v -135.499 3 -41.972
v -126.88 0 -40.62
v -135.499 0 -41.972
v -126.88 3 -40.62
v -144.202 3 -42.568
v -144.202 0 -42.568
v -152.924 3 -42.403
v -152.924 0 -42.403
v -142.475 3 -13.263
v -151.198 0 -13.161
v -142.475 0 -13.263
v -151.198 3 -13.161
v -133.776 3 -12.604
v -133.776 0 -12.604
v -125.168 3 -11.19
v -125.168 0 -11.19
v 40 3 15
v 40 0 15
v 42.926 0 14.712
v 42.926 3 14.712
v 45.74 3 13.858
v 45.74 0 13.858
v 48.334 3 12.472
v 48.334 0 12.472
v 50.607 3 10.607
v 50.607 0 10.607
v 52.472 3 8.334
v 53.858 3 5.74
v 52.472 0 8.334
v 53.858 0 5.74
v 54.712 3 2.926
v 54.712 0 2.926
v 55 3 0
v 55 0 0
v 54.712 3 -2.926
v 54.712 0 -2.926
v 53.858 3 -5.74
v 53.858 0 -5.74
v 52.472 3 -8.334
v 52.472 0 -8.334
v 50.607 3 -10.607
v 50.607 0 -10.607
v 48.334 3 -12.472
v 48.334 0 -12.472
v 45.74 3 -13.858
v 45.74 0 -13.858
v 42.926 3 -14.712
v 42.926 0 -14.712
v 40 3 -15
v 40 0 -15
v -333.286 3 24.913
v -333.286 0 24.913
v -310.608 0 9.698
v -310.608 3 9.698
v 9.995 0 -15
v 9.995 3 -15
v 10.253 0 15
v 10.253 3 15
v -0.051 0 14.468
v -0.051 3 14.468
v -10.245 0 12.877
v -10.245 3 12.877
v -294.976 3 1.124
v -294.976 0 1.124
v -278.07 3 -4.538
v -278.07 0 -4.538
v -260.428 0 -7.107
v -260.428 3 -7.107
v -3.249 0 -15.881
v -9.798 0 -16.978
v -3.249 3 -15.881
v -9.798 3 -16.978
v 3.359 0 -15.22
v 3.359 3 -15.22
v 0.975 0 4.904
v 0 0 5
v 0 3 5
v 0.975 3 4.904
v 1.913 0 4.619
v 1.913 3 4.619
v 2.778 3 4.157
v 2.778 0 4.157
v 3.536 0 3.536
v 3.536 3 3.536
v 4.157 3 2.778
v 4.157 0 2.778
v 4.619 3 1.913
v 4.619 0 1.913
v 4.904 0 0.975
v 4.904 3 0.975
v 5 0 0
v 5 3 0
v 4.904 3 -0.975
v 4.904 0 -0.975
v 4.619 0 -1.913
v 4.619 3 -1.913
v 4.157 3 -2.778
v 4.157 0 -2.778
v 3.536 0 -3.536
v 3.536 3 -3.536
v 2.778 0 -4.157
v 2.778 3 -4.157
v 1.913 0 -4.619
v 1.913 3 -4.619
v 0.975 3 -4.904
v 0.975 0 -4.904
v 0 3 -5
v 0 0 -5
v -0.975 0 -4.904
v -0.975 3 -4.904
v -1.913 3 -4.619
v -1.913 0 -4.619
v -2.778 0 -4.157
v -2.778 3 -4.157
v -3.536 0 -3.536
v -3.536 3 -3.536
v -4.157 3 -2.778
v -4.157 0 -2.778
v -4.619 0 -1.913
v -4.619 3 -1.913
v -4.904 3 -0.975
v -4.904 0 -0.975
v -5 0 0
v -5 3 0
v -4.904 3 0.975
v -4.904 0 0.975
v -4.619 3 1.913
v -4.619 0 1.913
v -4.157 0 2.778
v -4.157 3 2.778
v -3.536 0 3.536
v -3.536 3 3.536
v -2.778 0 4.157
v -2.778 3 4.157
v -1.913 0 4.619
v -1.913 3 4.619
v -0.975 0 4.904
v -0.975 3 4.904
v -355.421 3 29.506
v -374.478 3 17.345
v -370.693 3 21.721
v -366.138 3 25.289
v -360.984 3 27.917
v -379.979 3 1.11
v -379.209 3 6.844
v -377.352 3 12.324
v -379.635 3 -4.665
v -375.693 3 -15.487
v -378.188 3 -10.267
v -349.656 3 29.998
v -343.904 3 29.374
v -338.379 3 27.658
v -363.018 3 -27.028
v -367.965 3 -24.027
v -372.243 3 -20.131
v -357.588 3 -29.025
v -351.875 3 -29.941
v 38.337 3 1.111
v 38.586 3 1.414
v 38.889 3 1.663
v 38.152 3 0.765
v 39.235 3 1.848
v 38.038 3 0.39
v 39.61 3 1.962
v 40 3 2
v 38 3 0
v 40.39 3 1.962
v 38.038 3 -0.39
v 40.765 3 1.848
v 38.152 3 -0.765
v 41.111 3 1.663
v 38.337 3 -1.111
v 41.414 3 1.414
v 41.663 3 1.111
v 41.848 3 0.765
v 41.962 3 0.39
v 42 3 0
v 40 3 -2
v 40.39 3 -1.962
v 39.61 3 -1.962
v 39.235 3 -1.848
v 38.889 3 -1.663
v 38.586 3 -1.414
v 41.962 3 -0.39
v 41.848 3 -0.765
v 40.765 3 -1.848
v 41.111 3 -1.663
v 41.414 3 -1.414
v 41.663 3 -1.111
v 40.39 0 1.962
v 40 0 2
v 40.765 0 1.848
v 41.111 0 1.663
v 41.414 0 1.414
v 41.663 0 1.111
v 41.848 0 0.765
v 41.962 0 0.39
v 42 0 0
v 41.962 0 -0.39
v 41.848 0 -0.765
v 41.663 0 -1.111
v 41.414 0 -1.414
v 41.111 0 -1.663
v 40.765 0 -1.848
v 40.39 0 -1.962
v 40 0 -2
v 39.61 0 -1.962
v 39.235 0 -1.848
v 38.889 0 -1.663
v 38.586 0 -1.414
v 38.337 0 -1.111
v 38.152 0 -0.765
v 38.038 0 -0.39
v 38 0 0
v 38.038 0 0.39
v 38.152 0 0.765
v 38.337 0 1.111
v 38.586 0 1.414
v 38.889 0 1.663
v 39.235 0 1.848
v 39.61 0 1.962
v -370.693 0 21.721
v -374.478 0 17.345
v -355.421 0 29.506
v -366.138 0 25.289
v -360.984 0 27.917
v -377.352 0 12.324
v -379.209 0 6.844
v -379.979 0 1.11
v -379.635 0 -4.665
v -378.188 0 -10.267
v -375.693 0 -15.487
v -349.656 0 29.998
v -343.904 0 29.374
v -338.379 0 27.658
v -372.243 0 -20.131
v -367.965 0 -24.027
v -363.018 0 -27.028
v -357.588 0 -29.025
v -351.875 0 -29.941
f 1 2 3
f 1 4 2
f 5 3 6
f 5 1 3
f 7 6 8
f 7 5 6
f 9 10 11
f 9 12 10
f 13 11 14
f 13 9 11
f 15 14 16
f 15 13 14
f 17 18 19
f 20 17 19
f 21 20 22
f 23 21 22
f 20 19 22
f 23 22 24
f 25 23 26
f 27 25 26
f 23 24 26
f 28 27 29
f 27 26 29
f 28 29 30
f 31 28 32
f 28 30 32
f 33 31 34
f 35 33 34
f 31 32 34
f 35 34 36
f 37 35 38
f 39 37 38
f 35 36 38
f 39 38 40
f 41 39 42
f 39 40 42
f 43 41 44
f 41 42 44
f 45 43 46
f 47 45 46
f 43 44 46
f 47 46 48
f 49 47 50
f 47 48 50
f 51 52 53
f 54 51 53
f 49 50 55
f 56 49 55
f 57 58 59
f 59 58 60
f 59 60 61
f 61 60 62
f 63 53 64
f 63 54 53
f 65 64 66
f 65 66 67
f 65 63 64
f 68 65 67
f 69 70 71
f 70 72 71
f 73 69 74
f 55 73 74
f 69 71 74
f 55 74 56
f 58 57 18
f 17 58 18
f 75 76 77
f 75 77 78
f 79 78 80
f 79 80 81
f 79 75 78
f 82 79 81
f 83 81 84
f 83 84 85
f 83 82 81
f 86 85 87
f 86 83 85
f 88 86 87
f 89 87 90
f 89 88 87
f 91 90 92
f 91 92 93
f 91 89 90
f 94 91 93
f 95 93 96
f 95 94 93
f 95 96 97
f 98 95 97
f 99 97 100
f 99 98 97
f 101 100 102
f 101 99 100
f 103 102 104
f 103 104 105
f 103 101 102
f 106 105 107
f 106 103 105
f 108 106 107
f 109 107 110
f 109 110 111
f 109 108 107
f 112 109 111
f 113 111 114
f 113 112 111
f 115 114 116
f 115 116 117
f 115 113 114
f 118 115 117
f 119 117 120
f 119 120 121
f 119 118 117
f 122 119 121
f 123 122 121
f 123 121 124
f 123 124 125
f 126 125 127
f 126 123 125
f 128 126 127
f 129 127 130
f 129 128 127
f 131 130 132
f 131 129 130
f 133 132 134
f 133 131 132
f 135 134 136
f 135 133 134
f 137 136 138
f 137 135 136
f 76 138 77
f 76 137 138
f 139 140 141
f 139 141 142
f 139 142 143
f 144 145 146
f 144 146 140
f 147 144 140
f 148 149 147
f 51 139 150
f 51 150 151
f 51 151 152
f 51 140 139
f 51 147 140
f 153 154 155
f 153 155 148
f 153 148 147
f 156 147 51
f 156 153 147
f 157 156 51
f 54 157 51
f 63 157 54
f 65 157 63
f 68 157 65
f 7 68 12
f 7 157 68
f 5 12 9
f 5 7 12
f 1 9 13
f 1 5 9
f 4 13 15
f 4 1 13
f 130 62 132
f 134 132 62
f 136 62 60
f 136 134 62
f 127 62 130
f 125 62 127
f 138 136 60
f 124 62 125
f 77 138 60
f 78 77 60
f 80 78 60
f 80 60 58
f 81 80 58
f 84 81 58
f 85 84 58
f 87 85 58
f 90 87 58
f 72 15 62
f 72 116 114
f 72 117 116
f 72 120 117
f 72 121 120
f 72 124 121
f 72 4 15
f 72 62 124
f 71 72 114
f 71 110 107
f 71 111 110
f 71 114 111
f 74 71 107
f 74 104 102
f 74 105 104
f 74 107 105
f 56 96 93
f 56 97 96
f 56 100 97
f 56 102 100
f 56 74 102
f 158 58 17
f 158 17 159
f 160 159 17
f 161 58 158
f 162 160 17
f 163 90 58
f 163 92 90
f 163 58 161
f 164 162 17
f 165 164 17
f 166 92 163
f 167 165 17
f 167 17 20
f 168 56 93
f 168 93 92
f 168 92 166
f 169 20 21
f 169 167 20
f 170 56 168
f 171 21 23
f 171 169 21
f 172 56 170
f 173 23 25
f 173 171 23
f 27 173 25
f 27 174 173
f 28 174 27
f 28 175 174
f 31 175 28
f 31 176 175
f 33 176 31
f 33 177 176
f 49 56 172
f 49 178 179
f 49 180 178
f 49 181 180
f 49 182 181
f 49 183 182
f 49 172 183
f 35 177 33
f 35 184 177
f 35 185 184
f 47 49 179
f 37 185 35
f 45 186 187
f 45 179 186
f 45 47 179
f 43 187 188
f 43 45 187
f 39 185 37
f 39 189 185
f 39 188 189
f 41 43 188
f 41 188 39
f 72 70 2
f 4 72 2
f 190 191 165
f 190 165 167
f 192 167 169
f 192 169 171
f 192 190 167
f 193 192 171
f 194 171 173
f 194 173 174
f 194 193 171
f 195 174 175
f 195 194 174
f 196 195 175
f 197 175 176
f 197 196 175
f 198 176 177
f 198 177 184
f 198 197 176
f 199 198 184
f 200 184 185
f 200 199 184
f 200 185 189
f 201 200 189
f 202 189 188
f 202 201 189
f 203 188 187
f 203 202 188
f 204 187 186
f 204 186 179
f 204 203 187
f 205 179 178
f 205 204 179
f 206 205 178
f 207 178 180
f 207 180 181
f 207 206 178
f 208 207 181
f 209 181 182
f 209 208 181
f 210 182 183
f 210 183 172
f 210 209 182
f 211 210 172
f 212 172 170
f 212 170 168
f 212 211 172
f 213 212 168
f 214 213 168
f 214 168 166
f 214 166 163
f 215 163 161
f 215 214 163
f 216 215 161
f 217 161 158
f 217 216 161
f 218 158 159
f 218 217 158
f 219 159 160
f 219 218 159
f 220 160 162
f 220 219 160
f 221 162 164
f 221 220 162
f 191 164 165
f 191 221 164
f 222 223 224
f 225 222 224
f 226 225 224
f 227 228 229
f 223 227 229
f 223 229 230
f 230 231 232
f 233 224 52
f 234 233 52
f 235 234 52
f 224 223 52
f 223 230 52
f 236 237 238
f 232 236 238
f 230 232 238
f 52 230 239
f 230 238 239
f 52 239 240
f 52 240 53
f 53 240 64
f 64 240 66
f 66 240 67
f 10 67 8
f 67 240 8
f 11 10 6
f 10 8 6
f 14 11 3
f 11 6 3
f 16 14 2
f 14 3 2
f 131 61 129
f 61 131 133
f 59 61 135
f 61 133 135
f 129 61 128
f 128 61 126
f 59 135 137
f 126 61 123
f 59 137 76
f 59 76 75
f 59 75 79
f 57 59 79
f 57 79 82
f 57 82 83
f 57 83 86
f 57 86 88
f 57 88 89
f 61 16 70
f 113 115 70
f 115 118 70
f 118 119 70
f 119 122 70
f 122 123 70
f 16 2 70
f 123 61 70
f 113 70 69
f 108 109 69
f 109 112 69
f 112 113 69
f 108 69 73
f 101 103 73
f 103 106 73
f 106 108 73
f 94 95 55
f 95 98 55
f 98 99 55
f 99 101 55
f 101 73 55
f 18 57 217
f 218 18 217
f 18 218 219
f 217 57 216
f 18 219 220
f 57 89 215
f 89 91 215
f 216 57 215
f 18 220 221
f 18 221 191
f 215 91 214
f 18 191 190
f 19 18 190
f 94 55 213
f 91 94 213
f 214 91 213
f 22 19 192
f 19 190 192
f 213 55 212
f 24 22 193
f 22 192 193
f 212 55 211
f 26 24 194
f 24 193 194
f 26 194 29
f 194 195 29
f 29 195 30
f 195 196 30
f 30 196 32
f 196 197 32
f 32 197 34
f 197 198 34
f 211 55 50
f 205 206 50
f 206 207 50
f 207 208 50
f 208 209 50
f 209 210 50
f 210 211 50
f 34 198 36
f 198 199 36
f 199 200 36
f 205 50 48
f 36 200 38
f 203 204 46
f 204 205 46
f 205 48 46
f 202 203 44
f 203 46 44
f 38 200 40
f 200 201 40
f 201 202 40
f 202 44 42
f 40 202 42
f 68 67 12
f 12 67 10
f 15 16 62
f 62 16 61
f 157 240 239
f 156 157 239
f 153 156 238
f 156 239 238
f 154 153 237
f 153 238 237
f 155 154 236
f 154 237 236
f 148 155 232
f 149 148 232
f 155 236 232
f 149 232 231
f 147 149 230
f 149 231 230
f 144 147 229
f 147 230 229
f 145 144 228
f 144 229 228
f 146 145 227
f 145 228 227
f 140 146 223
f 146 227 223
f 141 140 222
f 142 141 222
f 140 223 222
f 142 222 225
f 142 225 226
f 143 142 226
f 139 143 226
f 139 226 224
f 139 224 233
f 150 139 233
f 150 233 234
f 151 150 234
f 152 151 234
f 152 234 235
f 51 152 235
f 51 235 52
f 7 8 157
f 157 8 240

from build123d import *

# Parameters (mm, degrees)
SKETCH1_R           = 5
SKETCH1_R_2         = 2
BOSS_EXTRUDE1_DEPTH = 3
FILLET1_R           = 100


with BuildPart() as part:
    # Sketch1 → Boss-Extrude1 (new body)
    with BuildSketch(Plane(origin=(0, 0, 0), x_dir=(1, 0, 0), z_dir=(0, 1, 0))):
        with BuildLine():
            Line((0, 15), (-139.784941349, 43.225909045))
            Line((-139.784941349, 43.225909045), (-351.875415017, 29.941322925))
            ThreePointArc((-351.875415017, 29.941322925), (-378.412739548, -9.628926804), (-333.285739517, -24.912516864))
            Line((-333.285739517, -24.912516864), (-287.823465989, 5.588948968))
            Line((-287.823465989, 5.588948968), (-138.053278996, 13.889014505))
            Line((-138.053278996, 13.889014505), (-5.919683, -13.782501703))
            Line((-5.919683, -13.782501703), (0, -15))
            Line((0, -15), (40, -15))
            ThreePointArc((40, -15), (55, 0), (40, 15))
            Line((40, 15), (0, 15))
        make_face()
        with Locations(Location((0, 0, 0), (0, 0, 270))):
            Circle(SKETCH1_R, mode=Mode.SUBTRACT)
        with Locations(Location((40, 0, 0), (0, 0, 270))):
            Circle(SKETCH1_R_2, mode=Mode.SUBTRACT)
    extrude(amount=BOSS_EXTRUDE1_DEPTH)

    # Fillet1
    fillet1_edges = [part.edges().sort_by_distance(p)[0] for p in [
        (0, 1.5, -15),
        (-139.784941349, 1.5, -43.225909045),
        (-138.053278996, 1.5, -13.889014505),
        (-287.823465989, 1.5, -5.588948968),
        (0, 1.5, 15),
    ]]
    fillet(fillet1_edges, radius=FILLET1_R)


solid = part.part
